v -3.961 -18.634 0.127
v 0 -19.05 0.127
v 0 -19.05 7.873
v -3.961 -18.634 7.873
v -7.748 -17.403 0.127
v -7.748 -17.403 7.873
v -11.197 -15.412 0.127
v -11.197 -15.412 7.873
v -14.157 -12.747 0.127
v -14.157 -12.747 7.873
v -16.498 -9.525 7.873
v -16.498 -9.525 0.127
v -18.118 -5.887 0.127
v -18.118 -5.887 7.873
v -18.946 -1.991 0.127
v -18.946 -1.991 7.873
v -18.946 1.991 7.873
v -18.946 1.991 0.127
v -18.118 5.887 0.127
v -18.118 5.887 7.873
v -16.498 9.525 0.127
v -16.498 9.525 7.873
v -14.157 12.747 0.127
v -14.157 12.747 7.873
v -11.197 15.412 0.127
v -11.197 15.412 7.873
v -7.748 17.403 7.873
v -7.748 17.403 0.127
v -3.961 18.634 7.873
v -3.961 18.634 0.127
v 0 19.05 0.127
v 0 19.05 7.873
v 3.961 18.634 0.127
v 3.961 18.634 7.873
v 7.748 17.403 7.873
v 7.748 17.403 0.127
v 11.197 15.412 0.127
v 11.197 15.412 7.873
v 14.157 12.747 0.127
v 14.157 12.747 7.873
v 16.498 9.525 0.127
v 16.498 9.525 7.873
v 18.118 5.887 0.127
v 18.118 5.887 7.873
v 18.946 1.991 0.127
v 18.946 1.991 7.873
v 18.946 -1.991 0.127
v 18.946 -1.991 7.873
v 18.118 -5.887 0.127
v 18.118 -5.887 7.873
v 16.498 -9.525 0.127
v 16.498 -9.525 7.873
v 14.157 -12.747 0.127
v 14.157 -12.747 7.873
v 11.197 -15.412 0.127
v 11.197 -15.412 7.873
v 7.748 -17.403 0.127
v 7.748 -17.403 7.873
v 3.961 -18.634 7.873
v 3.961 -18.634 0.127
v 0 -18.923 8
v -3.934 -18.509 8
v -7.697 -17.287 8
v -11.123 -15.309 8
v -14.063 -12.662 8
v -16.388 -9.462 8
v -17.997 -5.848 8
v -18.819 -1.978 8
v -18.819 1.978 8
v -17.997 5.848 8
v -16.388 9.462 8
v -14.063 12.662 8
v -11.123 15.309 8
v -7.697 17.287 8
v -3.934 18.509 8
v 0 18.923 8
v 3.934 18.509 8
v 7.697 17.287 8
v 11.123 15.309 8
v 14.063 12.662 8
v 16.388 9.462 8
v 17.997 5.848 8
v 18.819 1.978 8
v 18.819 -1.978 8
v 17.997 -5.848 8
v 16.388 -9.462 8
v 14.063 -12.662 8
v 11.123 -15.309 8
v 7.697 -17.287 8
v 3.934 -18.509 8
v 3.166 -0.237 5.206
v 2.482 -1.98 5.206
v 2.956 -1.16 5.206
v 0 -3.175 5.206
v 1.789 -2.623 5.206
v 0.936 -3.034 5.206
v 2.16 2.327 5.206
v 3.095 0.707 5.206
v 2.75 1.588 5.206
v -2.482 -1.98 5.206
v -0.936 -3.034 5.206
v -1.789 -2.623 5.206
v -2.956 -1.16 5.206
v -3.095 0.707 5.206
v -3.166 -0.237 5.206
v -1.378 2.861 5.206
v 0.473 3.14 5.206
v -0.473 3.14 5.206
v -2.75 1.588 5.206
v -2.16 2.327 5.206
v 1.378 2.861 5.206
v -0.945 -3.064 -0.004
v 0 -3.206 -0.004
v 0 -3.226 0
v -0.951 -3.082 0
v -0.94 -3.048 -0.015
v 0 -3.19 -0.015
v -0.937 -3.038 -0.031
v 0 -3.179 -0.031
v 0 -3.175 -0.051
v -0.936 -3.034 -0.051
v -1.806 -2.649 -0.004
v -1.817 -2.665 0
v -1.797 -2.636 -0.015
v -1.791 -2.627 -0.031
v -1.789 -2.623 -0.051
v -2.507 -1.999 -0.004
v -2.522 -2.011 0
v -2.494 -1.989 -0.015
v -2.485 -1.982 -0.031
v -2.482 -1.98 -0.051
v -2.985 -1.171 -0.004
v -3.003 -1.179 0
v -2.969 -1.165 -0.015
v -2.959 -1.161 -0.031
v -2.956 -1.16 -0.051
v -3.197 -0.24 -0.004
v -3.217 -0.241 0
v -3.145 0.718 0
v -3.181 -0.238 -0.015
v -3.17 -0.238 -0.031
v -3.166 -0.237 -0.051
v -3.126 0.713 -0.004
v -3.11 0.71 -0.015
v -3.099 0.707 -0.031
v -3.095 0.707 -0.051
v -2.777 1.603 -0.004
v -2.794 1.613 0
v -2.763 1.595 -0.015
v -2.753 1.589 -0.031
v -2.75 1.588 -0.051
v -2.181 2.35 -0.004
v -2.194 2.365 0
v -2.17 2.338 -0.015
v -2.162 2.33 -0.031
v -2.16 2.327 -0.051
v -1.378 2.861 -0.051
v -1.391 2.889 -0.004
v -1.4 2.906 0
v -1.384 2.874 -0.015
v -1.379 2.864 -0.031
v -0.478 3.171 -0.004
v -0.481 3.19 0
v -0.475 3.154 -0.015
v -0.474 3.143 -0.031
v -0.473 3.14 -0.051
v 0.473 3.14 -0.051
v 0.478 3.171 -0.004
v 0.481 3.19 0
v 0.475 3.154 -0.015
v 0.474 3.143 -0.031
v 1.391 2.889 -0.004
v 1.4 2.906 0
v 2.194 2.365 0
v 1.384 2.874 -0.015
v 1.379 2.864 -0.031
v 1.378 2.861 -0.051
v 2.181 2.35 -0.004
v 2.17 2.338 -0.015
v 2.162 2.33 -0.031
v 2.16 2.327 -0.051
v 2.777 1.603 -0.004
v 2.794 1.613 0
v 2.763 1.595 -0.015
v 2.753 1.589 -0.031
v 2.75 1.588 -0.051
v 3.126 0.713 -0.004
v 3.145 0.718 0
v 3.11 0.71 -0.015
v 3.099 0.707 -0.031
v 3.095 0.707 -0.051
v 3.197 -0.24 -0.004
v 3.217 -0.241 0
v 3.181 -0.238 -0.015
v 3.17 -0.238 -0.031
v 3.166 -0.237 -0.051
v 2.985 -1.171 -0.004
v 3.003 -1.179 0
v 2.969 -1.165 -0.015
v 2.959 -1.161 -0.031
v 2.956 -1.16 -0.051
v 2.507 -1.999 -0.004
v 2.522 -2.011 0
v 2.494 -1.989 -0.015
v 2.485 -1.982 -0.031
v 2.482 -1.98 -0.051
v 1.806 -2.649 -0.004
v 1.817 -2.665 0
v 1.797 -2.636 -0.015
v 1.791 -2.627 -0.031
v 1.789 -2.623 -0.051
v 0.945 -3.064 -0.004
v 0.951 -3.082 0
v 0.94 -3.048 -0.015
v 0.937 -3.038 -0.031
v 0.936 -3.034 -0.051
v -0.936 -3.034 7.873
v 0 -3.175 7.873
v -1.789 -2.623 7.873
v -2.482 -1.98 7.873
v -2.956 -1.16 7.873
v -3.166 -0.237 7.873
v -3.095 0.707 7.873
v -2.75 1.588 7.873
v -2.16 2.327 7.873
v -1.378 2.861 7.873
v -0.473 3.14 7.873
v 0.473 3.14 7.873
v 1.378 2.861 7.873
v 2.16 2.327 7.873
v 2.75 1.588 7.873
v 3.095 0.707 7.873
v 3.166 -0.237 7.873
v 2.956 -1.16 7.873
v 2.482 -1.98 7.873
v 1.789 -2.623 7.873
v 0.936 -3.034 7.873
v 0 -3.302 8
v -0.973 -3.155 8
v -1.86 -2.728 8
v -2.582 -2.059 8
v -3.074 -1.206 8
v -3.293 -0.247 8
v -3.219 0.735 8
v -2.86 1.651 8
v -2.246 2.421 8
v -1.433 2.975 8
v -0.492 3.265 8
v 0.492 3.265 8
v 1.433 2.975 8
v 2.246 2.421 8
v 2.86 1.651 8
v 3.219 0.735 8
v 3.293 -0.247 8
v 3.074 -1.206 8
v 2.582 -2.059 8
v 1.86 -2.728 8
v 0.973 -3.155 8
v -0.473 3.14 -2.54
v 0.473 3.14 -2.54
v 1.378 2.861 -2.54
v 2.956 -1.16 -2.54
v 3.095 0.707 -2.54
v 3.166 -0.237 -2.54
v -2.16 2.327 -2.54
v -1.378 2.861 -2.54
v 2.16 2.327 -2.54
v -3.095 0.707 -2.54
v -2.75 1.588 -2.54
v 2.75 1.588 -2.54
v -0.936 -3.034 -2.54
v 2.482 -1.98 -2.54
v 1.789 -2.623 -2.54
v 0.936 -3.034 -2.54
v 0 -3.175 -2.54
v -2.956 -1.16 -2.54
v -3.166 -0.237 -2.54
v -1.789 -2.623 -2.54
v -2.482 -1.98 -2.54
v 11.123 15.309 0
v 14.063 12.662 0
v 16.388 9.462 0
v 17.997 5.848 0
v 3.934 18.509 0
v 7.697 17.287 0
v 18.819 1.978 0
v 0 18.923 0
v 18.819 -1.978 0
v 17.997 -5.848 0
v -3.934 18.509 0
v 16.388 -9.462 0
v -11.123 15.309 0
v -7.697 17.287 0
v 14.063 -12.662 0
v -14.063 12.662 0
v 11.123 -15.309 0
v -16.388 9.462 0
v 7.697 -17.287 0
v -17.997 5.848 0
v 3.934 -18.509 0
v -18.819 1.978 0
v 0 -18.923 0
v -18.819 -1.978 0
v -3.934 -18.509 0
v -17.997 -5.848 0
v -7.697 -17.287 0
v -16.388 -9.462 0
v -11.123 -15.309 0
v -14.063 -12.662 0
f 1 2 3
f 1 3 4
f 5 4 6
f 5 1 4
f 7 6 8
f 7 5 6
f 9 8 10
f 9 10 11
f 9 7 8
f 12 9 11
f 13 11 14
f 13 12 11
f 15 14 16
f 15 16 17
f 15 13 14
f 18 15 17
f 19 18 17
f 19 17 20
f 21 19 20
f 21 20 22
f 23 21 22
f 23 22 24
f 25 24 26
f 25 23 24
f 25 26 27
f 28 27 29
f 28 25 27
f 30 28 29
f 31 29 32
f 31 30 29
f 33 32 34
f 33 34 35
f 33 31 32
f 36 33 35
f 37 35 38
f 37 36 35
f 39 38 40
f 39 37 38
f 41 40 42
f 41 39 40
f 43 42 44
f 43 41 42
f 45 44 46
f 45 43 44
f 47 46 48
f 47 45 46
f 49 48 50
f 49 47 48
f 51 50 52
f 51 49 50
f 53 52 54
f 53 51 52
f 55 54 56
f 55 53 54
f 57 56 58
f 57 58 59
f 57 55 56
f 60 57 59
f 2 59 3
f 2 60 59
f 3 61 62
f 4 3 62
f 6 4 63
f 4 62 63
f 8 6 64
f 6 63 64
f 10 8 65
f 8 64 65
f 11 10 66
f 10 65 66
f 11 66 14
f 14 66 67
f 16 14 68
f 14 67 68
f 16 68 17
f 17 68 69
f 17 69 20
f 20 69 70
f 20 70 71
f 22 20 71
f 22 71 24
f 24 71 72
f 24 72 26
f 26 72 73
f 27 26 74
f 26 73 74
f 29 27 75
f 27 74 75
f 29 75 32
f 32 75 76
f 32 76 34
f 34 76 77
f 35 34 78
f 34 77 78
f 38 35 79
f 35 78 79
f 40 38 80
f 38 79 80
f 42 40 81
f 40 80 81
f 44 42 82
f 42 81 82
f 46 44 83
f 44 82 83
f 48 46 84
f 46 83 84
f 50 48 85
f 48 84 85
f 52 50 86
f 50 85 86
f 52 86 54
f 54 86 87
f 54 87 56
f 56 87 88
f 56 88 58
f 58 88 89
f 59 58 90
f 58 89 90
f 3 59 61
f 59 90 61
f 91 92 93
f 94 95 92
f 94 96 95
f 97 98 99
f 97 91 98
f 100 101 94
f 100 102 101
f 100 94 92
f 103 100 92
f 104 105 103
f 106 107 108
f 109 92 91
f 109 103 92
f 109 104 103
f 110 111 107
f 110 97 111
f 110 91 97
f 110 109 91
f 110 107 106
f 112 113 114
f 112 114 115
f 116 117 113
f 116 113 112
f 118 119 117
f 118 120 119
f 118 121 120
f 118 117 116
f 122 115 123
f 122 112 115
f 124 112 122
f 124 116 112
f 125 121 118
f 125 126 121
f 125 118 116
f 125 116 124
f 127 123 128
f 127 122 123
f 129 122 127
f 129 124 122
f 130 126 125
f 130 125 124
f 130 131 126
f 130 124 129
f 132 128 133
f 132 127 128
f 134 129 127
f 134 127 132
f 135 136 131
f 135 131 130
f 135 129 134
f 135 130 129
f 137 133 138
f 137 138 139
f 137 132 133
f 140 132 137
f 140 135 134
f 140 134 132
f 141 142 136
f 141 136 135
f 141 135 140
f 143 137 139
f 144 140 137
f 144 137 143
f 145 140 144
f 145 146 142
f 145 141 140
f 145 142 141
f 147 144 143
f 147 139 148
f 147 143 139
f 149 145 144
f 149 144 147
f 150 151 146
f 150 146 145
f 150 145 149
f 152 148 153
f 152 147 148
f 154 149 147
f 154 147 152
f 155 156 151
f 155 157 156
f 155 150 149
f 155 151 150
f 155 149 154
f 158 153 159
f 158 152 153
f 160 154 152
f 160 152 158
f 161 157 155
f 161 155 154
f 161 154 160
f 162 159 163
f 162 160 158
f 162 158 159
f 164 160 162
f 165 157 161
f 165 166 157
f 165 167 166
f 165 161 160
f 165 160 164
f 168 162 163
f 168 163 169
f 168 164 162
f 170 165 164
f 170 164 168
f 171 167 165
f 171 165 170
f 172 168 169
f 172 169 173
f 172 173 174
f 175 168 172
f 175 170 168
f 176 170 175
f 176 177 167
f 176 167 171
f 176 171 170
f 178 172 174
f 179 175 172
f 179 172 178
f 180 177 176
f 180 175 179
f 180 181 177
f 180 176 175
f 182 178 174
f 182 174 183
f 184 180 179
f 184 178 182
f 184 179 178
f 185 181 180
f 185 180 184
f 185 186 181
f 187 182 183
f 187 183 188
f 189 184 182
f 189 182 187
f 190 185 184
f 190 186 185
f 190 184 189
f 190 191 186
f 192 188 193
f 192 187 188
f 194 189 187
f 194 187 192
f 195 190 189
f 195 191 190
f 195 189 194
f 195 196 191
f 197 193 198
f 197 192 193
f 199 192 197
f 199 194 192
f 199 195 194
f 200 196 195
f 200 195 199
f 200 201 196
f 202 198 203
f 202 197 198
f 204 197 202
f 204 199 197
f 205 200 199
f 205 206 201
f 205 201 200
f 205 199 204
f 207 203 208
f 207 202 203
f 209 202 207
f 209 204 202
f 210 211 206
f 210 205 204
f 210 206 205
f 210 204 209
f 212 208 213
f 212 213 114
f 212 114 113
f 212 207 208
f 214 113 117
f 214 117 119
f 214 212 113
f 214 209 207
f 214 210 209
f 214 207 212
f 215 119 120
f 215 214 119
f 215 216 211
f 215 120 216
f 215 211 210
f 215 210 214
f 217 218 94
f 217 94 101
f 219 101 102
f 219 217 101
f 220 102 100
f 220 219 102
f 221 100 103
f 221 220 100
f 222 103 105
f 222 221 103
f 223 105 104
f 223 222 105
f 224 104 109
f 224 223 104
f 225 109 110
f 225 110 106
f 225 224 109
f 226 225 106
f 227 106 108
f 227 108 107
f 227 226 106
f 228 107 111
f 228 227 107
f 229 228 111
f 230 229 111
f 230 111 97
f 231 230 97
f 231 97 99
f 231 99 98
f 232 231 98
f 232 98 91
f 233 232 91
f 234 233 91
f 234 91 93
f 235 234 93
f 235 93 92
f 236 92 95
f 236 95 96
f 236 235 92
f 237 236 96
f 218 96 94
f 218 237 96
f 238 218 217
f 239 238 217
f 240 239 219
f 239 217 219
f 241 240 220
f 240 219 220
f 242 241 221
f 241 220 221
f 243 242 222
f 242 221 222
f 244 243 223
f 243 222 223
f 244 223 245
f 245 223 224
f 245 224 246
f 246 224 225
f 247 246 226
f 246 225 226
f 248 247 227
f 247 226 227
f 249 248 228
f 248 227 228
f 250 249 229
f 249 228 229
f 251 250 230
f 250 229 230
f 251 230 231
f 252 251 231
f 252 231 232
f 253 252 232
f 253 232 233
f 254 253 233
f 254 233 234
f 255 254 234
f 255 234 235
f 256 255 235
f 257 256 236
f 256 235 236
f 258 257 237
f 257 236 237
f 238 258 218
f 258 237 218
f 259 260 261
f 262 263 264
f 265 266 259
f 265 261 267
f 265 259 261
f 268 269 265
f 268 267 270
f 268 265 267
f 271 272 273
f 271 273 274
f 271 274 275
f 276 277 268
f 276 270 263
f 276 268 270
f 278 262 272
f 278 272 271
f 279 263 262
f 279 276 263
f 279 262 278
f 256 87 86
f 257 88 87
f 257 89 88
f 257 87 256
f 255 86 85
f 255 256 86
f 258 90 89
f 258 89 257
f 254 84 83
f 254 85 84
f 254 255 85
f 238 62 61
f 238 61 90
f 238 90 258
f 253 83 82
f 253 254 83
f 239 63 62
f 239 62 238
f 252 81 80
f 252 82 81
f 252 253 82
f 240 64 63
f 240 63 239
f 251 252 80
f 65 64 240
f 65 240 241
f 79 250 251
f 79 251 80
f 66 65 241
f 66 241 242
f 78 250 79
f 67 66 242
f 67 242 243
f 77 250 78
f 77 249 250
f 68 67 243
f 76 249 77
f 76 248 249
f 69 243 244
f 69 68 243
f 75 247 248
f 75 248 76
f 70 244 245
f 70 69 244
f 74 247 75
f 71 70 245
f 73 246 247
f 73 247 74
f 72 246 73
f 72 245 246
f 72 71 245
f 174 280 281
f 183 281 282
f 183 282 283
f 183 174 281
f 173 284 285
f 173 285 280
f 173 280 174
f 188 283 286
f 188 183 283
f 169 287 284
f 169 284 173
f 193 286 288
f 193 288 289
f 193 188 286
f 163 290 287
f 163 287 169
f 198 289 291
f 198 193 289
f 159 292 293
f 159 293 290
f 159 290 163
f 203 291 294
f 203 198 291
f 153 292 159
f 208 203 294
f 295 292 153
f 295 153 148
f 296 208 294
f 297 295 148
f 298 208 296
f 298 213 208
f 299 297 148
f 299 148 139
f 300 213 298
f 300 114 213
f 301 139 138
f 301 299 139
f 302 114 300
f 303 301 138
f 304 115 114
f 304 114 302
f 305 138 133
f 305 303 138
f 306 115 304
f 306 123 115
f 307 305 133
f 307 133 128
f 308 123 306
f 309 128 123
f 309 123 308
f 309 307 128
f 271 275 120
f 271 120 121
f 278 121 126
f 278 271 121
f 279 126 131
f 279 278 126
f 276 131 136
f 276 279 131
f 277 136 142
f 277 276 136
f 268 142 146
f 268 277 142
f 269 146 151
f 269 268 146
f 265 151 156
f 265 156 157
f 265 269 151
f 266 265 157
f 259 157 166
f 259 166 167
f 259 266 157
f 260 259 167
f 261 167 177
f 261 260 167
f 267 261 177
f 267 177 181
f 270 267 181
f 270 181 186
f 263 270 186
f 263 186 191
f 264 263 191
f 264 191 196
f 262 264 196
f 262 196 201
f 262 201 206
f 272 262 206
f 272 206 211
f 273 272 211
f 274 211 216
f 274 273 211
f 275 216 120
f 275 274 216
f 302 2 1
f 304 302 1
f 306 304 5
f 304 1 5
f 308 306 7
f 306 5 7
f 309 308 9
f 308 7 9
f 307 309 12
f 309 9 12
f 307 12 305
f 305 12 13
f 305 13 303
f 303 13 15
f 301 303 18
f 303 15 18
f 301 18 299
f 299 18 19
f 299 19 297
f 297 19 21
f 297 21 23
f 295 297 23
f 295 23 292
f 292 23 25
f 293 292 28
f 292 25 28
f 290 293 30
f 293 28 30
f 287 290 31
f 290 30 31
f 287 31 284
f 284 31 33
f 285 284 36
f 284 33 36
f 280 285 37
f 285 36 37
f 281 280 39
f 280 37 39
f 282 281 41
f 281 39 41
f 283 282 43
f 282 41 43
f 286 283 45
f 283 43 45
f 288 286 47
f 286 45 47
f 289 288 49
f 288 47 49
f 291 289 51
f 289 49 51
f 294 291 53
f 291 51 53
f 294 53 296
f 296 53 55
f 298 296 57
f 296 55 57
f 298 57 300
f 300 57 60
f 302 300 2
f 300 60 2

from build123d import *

# Parameters (mm, degrees)
F2_R    = 0.0508
F3_SIZE = 0.127


with BuildPart() as f1:
    # F0 (on Right) → F1 (revolve)
    with BuildSketch(Plane.YZ):
        Polygon((-3.175, -2.54), (0, -2.54), (0, 0), (0, 5.206), (-3.175, 5.206), (-3.175, 8), (-19.05, 8), (-19.05, 0), (-3.175, 0), align=None)
    revolve(axis=Axis((0, 0, 2.603), (0, 0, -1)))

    # F2
    f2_edges = [f1.edges().sort_by_distance(p)[0] for p in [
        (0, 3.175, 0),
    ]]
    fillet(f2_edges, radius=F2_R)

    # F3
    f3_edges = [f1.edges().sort_by_distance(p)[0] for p in [
        (0, 19.05, 0),
        (0, 19.05, 8),
        (0, 3.175, 8),
    ]]
    chamfer(f3_edges, length=F3_SIZE)


solid = f1.part
